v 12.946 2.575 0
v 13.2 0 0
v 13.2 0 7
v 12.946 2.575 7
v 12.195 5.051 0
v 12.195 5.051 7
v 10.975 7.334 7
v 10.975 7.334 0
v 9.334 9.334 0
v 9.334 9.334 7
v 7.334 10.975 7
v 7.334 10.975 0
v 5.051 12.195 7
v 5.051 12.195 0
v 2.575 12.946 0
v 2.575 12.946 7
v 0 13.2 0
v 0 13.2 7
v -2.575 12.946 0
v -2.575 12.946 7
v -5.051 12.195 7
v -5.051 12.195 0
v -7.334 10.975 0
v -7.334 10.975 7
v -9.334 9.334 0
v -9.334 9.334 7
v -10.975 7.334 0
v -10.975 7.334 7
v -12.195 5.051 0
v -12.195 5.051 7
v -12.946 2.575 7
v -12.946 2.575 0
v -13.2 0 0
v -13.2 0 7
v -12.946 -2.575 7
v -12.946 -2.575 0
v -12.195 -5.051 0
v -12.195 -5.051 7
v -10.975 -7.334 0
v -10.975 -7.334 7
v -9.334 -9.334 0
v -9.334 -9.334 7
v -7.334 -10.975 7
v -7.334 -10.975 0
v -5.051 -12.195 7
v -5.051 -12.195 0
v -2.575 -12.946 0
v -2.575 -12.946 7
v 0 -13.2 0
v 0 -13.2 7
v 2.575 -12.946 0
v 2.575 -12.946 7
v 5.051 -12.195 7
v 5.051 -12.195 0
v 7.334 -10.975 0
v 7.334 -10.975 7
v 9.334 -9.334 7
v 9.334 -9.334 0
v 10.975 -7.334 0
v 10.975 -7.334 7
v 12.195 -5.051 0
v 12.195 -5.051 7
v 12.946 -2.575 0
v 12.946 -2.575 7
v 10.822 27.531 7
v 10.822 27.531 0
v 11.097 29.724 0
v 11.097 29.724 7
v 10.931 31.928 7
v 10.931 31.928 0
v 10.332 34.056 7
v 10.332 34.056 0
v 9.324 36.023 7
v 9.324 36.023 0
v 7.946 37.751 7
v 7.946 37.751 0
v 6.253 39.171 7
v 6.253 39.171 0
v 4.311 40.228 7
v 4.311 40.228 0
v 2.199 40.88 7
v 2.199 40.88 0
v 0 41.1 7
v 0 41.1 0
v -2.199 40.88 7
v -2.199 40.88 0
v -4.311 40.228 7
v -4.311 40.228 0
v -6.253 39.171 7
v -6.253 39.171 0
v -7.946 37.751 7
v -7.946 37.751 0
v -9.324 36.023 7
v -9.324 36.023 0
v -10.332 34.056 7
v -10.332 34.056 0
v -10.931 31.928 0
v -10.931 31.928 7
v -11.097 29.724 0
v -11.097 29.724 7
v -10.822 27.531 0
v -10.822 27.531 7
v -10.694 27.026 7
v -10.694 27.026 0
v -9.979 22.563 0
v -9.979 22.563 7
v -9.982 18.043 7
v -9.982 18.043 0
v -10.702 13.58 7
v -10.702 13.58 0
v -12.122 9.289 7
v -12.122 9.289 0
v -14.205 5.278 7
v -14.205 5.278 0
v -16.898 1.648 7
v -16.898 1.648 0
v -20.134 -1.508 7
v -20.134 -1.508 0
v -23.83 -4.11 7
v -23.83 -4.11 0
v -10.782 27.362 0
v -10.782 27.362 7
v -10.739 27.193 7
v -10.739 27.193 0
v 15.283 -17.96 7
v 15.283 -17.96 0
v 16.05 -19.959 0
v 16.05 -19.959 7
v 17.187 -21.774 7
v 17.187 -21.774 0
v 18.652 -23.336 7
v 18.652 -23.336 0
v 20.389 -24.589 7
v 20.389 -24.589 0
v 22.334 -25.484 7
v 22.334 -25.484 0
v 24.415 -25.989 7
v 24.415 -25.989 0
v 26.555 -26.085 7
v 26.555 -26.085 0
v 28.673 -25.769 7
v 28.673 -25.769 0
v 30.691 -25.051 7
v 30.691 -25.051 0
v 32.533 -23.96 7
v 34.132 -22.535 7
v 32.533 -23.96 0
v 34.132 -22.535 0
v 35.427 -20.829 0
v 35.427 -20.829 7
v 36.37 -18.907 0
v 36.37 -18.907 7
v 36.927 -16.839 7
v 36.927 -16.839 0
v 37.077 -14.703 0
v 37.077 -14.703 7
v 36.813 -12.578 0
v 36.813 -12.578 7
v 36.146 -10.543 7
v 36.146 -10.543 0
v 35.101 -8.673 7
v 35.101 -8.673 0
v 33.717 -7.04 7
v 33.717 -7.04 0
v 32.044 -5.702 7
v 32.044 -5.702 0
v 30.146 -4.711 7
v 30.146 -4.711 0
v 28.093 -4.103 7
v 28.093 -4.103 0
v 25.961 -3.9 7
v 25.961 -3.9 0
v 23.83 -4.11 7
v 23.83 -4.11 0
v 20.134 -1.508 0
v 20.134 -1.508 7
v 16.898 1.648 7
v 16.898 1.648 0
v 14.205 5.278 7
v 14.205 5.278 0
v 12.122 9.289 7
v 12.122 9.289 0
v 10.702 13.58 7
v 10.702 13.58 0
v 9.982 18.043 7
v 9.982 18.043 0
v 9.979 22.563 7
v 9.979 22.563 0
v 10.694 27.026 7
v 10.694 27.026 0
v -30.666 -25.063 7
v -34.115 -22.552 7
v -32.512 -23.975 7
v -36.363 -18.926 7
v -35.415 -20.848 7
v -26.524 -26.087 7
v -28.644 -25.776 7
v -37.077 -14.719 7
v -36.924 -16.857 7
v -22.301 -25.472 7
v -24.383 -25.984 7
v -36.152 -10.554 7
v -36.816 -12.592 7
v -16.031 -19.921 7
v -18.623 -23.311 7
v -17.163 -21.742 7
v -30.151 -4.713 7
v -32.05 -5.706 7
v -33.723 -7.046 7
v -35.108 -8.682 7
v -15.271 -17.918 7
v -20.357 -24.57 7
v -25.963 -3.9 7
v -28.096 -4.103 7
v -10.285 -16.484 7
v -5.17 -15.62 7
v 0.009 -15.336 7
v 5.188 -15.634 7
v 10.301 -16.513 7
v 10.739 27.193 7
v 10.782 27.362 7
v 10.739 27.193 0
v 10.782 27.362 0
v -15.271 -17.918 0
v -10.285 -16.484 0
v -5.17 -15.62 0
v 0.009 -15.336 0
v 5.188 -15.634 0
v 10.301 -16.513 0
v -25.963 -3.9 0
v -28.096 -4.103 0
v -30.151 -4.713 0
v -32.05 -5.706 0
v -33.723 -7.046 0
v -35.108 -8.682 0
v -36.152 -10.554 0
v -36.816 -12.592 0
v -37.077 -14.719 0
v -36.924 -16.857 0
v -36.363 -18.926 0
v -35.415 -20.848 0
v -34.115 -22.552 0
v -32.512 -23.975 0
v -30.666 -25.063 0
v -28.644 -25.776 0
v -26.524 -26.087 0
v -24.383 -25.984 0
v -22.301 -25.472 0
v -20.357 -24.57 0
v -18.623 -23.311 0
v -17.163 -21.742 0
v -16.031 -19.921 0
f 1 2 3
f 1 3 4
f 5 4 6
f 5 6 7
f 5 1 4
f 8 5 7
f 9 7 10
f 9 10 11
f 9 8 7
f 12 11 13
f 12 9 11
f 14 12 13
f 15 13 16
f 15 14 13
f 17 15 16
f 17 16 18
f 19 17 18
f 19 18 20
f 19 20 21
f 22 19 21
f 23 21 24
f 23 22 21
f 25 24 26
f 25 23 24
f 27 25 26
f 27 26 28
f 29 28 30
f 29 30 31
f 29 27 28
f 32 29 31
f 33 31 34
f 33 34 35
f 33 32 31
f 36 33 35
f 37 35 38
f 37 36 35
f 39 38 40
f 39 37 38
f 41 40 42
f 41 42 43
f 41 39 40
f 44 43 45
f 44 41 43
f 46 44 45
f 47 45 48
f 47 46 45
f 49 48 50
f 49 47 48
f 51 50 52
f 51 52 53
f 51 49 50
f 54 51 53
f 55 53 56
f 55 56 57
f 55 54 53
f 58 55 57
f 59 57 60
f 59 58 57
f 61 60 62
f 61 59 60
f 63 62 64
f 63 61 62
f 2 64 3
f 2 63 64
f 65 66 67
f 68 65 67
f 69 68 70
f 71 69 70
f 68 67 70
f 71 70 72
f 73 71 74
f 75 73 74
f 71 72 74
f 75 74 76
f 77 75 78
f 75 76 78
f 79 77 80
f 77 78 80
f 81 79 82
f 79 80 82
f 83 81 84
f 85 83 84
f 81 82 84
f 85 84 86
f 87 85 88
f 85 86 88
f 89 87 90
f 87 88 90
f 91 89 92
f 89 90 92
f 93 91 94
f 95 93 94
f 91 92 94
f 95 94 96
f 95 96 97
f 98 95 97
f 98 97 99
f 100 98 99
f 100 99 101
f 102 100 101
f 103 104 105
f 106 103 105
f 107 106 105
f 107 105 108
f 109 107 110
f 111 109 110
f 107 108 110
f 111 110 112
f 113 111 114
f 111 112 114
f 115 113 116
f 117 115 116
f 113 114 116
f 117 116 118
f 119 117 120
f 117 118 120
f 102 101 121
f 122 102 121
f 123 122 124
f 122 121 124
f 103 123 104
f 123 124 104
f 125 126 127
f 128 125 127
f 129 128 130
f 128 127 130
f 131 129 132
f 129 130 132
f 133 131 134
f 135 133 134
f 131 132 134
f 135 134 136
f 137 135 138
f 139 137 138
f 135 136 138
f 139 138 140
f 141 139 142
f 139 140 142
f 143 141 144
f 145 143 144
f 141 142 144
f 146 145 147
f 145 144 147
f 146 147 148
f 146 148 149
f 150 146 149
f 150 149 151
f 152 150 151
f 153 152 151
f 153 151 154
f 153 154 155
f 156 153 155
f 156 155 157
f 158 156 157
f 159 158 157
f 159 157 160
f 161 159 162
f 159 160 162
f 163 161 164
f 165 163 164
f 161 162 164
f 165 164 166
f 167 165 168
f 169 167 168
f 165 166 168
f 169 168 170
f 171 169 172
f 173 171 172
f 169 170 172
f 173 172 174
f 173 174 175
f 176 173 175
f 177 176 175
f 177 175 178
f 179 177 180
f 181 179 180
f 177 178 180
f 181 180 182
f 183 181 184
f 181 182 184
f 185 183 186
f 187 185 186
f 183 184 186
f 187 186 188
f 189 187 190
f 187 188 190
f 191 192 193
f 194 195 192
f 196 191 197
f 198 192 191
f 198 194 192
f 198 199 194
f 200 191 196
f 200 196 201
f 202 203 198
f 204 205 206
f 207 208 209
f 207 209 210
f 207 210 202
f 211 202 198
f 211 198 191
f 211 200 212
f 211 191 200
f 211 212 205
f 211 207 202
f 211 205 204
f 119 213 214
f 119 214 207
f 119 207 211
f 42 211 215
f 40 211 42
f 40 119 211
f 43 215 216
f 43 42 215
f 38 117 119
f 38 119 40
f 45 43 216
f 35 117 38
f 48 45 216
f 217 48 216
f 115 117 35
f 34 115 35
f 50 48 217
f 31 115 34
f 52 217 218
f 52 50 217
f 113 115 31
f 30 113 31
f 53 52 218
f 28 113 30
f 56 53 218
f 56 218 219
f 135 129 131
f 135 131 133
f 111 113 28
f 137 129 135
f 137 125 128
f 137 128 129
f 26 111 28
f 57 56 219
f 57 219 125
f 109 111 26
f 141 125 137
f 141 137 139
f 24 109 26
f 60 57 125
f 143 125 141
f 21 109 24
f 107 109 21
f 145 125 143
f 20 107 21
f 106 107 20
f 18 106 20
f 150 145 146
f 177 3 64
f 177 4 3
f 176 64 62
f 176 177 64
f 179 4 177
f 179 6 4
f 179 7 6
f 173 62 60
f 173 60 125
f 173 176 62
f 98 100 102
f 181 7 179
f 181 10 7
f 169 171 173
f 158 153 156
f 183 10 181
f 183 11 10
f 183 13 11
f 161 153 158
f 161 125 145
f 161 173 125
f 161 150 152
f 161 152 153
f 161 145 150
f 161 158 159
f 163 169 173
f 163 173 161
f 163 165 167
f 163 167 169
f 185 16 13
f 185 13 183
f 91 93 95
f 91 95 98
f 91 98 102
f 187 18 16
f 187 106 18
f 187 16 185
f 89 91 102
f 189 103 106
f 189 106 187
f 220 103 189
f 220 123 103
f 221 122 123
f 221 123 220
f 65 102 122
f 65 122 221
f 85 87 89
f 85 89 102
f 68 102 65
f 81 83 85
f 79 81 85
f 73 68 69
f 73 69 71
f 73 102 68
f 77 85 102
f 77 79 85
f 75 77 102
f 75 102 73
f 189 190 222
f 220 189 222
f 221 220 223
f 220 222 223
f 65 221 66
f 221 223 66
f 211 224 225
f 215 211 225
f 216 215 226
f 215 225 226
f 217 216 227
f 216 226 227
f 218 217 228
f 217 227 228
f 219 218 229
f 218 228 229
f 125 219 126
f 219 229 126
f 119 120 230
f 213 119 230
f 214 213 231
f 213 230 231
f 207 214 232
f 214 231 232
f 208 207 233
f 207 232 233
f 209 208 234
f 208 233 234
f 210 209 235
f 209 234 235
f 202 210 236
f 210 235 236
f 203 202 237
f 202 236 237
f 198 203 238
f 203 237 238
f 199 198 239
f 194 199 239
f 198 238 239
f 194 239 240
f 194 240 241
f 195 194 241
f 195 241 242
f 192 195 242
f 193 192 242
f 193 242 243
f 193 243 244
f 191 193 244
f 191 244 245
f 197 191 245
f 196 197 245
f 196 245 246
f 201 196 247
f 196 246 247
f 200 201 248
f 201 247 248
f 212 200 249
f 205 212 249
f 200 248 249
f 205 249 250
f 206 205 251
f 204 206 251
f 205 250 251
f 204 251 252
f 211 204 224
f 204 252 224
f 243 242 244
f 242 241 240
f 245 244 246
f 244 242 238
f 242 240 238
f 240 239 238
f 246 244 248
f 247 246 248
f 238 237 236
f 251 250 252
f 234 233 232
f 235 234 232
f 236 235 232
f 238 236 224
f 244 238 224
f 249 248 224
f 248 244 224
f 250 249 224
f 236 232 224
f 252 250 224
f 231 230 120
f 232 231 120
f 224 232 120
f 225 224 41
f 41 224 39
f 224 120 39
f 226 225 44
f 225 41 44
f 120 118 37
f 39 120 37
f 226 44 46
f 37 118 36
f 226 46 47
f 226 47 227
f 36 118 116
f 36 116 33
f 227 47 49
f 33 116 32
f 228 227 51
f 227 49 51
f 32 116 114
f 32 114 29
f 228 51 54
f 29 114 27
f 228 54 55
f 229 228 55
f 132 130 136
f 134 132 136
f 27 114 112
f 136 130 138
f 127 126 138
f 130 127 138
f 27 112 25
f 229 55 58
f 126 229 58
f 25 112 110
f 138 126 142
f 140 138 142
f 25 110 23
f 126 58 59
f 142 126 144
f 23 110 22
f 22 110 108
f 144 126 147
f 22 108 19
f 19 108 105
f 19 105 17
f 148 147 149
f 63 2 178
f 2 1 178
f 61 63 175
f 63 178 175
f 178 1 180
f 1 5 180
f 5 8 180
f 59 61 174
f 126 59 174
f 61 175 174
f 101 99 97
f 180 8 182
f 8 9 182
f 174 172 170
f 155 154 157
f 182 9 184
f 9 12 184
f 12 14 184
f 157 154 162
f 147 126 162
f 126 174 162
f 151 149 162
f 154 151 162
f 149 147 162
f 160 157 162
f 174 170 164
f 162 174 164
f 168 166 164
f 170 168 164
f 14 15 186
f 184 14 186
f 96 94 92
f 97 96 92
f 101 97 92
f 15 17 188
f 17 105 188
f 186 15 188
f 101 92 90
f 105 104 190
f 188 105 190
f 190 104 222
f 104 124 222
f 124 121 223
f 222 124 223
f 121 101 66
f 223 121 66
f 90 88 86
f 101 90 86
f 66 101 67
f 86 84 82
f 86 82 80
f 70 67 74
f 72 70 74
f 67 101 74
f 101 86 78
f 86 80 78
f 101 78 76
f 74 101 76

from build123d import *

# Parameters (mm, degrees)
F1_R     = 13.2
F2_DEPTH = 7


with BuildPart() as f2:
    # F1 (on Top) → F2 (new body)
    with BuildSketch(Plane.XY):
        with BuildLine():
            ThreePointArc((10.821909, 27.530935), (10.756845, 27.278632), (10.694101, 27.025743))
            ThreePointArc((10.694101, 27.025743), (10.76097, 27.277589), (10.821909, 27.530935))
        make_face()
        with BuildLine():
            ThreePointArc((23.829551, -4.11045), (12.121504, 9.289095), (10.694101, 27.025743))
            ThreePointArc((10.694101, 27.025743), (10.756845, 27.278632), (10.821909, 27.530935))
            ThreePointArc((10.821909, 27.530935), (0, 41.1), (-10.821909, 27.530935))
            ThreePointArc((-10.821909, 27.530935), (-10.756845, 27.278632), (-10.694101, 27.025743))
            ThreePointArc((-10.694101, 27.025743), (-12.121504, 9.289095), (-23.829551, -4.11045))
            ThreePointArc((-23.829551, -4.11045), (-35.415268, -20.848085), (-15.271056, -17.917565))
            ThreePointArc((-15.271056, -17.917565), (0.00942, -15.335501), (15.28268, -17.959904))
            ThreePointArc((15.28268, -17.959904), (35.426816, -20.829414), (23.829551, -4.11045))
        make_face()
        Circle(F1_R, mode=Mode.SUBTRACT)
        with BuildLine():
            ThreePointArc((-10.694101, 27.025743), (-10.756845, 27.278632), (-10.821909, 27.530935))
            ThreePointArc((-10.821909, 27.530935), (-10.76097, 27.277589), (-10.694101, 27.025743))
        make_face()
    extrude(amount=F2_DEPTH)


solid = f2.part
